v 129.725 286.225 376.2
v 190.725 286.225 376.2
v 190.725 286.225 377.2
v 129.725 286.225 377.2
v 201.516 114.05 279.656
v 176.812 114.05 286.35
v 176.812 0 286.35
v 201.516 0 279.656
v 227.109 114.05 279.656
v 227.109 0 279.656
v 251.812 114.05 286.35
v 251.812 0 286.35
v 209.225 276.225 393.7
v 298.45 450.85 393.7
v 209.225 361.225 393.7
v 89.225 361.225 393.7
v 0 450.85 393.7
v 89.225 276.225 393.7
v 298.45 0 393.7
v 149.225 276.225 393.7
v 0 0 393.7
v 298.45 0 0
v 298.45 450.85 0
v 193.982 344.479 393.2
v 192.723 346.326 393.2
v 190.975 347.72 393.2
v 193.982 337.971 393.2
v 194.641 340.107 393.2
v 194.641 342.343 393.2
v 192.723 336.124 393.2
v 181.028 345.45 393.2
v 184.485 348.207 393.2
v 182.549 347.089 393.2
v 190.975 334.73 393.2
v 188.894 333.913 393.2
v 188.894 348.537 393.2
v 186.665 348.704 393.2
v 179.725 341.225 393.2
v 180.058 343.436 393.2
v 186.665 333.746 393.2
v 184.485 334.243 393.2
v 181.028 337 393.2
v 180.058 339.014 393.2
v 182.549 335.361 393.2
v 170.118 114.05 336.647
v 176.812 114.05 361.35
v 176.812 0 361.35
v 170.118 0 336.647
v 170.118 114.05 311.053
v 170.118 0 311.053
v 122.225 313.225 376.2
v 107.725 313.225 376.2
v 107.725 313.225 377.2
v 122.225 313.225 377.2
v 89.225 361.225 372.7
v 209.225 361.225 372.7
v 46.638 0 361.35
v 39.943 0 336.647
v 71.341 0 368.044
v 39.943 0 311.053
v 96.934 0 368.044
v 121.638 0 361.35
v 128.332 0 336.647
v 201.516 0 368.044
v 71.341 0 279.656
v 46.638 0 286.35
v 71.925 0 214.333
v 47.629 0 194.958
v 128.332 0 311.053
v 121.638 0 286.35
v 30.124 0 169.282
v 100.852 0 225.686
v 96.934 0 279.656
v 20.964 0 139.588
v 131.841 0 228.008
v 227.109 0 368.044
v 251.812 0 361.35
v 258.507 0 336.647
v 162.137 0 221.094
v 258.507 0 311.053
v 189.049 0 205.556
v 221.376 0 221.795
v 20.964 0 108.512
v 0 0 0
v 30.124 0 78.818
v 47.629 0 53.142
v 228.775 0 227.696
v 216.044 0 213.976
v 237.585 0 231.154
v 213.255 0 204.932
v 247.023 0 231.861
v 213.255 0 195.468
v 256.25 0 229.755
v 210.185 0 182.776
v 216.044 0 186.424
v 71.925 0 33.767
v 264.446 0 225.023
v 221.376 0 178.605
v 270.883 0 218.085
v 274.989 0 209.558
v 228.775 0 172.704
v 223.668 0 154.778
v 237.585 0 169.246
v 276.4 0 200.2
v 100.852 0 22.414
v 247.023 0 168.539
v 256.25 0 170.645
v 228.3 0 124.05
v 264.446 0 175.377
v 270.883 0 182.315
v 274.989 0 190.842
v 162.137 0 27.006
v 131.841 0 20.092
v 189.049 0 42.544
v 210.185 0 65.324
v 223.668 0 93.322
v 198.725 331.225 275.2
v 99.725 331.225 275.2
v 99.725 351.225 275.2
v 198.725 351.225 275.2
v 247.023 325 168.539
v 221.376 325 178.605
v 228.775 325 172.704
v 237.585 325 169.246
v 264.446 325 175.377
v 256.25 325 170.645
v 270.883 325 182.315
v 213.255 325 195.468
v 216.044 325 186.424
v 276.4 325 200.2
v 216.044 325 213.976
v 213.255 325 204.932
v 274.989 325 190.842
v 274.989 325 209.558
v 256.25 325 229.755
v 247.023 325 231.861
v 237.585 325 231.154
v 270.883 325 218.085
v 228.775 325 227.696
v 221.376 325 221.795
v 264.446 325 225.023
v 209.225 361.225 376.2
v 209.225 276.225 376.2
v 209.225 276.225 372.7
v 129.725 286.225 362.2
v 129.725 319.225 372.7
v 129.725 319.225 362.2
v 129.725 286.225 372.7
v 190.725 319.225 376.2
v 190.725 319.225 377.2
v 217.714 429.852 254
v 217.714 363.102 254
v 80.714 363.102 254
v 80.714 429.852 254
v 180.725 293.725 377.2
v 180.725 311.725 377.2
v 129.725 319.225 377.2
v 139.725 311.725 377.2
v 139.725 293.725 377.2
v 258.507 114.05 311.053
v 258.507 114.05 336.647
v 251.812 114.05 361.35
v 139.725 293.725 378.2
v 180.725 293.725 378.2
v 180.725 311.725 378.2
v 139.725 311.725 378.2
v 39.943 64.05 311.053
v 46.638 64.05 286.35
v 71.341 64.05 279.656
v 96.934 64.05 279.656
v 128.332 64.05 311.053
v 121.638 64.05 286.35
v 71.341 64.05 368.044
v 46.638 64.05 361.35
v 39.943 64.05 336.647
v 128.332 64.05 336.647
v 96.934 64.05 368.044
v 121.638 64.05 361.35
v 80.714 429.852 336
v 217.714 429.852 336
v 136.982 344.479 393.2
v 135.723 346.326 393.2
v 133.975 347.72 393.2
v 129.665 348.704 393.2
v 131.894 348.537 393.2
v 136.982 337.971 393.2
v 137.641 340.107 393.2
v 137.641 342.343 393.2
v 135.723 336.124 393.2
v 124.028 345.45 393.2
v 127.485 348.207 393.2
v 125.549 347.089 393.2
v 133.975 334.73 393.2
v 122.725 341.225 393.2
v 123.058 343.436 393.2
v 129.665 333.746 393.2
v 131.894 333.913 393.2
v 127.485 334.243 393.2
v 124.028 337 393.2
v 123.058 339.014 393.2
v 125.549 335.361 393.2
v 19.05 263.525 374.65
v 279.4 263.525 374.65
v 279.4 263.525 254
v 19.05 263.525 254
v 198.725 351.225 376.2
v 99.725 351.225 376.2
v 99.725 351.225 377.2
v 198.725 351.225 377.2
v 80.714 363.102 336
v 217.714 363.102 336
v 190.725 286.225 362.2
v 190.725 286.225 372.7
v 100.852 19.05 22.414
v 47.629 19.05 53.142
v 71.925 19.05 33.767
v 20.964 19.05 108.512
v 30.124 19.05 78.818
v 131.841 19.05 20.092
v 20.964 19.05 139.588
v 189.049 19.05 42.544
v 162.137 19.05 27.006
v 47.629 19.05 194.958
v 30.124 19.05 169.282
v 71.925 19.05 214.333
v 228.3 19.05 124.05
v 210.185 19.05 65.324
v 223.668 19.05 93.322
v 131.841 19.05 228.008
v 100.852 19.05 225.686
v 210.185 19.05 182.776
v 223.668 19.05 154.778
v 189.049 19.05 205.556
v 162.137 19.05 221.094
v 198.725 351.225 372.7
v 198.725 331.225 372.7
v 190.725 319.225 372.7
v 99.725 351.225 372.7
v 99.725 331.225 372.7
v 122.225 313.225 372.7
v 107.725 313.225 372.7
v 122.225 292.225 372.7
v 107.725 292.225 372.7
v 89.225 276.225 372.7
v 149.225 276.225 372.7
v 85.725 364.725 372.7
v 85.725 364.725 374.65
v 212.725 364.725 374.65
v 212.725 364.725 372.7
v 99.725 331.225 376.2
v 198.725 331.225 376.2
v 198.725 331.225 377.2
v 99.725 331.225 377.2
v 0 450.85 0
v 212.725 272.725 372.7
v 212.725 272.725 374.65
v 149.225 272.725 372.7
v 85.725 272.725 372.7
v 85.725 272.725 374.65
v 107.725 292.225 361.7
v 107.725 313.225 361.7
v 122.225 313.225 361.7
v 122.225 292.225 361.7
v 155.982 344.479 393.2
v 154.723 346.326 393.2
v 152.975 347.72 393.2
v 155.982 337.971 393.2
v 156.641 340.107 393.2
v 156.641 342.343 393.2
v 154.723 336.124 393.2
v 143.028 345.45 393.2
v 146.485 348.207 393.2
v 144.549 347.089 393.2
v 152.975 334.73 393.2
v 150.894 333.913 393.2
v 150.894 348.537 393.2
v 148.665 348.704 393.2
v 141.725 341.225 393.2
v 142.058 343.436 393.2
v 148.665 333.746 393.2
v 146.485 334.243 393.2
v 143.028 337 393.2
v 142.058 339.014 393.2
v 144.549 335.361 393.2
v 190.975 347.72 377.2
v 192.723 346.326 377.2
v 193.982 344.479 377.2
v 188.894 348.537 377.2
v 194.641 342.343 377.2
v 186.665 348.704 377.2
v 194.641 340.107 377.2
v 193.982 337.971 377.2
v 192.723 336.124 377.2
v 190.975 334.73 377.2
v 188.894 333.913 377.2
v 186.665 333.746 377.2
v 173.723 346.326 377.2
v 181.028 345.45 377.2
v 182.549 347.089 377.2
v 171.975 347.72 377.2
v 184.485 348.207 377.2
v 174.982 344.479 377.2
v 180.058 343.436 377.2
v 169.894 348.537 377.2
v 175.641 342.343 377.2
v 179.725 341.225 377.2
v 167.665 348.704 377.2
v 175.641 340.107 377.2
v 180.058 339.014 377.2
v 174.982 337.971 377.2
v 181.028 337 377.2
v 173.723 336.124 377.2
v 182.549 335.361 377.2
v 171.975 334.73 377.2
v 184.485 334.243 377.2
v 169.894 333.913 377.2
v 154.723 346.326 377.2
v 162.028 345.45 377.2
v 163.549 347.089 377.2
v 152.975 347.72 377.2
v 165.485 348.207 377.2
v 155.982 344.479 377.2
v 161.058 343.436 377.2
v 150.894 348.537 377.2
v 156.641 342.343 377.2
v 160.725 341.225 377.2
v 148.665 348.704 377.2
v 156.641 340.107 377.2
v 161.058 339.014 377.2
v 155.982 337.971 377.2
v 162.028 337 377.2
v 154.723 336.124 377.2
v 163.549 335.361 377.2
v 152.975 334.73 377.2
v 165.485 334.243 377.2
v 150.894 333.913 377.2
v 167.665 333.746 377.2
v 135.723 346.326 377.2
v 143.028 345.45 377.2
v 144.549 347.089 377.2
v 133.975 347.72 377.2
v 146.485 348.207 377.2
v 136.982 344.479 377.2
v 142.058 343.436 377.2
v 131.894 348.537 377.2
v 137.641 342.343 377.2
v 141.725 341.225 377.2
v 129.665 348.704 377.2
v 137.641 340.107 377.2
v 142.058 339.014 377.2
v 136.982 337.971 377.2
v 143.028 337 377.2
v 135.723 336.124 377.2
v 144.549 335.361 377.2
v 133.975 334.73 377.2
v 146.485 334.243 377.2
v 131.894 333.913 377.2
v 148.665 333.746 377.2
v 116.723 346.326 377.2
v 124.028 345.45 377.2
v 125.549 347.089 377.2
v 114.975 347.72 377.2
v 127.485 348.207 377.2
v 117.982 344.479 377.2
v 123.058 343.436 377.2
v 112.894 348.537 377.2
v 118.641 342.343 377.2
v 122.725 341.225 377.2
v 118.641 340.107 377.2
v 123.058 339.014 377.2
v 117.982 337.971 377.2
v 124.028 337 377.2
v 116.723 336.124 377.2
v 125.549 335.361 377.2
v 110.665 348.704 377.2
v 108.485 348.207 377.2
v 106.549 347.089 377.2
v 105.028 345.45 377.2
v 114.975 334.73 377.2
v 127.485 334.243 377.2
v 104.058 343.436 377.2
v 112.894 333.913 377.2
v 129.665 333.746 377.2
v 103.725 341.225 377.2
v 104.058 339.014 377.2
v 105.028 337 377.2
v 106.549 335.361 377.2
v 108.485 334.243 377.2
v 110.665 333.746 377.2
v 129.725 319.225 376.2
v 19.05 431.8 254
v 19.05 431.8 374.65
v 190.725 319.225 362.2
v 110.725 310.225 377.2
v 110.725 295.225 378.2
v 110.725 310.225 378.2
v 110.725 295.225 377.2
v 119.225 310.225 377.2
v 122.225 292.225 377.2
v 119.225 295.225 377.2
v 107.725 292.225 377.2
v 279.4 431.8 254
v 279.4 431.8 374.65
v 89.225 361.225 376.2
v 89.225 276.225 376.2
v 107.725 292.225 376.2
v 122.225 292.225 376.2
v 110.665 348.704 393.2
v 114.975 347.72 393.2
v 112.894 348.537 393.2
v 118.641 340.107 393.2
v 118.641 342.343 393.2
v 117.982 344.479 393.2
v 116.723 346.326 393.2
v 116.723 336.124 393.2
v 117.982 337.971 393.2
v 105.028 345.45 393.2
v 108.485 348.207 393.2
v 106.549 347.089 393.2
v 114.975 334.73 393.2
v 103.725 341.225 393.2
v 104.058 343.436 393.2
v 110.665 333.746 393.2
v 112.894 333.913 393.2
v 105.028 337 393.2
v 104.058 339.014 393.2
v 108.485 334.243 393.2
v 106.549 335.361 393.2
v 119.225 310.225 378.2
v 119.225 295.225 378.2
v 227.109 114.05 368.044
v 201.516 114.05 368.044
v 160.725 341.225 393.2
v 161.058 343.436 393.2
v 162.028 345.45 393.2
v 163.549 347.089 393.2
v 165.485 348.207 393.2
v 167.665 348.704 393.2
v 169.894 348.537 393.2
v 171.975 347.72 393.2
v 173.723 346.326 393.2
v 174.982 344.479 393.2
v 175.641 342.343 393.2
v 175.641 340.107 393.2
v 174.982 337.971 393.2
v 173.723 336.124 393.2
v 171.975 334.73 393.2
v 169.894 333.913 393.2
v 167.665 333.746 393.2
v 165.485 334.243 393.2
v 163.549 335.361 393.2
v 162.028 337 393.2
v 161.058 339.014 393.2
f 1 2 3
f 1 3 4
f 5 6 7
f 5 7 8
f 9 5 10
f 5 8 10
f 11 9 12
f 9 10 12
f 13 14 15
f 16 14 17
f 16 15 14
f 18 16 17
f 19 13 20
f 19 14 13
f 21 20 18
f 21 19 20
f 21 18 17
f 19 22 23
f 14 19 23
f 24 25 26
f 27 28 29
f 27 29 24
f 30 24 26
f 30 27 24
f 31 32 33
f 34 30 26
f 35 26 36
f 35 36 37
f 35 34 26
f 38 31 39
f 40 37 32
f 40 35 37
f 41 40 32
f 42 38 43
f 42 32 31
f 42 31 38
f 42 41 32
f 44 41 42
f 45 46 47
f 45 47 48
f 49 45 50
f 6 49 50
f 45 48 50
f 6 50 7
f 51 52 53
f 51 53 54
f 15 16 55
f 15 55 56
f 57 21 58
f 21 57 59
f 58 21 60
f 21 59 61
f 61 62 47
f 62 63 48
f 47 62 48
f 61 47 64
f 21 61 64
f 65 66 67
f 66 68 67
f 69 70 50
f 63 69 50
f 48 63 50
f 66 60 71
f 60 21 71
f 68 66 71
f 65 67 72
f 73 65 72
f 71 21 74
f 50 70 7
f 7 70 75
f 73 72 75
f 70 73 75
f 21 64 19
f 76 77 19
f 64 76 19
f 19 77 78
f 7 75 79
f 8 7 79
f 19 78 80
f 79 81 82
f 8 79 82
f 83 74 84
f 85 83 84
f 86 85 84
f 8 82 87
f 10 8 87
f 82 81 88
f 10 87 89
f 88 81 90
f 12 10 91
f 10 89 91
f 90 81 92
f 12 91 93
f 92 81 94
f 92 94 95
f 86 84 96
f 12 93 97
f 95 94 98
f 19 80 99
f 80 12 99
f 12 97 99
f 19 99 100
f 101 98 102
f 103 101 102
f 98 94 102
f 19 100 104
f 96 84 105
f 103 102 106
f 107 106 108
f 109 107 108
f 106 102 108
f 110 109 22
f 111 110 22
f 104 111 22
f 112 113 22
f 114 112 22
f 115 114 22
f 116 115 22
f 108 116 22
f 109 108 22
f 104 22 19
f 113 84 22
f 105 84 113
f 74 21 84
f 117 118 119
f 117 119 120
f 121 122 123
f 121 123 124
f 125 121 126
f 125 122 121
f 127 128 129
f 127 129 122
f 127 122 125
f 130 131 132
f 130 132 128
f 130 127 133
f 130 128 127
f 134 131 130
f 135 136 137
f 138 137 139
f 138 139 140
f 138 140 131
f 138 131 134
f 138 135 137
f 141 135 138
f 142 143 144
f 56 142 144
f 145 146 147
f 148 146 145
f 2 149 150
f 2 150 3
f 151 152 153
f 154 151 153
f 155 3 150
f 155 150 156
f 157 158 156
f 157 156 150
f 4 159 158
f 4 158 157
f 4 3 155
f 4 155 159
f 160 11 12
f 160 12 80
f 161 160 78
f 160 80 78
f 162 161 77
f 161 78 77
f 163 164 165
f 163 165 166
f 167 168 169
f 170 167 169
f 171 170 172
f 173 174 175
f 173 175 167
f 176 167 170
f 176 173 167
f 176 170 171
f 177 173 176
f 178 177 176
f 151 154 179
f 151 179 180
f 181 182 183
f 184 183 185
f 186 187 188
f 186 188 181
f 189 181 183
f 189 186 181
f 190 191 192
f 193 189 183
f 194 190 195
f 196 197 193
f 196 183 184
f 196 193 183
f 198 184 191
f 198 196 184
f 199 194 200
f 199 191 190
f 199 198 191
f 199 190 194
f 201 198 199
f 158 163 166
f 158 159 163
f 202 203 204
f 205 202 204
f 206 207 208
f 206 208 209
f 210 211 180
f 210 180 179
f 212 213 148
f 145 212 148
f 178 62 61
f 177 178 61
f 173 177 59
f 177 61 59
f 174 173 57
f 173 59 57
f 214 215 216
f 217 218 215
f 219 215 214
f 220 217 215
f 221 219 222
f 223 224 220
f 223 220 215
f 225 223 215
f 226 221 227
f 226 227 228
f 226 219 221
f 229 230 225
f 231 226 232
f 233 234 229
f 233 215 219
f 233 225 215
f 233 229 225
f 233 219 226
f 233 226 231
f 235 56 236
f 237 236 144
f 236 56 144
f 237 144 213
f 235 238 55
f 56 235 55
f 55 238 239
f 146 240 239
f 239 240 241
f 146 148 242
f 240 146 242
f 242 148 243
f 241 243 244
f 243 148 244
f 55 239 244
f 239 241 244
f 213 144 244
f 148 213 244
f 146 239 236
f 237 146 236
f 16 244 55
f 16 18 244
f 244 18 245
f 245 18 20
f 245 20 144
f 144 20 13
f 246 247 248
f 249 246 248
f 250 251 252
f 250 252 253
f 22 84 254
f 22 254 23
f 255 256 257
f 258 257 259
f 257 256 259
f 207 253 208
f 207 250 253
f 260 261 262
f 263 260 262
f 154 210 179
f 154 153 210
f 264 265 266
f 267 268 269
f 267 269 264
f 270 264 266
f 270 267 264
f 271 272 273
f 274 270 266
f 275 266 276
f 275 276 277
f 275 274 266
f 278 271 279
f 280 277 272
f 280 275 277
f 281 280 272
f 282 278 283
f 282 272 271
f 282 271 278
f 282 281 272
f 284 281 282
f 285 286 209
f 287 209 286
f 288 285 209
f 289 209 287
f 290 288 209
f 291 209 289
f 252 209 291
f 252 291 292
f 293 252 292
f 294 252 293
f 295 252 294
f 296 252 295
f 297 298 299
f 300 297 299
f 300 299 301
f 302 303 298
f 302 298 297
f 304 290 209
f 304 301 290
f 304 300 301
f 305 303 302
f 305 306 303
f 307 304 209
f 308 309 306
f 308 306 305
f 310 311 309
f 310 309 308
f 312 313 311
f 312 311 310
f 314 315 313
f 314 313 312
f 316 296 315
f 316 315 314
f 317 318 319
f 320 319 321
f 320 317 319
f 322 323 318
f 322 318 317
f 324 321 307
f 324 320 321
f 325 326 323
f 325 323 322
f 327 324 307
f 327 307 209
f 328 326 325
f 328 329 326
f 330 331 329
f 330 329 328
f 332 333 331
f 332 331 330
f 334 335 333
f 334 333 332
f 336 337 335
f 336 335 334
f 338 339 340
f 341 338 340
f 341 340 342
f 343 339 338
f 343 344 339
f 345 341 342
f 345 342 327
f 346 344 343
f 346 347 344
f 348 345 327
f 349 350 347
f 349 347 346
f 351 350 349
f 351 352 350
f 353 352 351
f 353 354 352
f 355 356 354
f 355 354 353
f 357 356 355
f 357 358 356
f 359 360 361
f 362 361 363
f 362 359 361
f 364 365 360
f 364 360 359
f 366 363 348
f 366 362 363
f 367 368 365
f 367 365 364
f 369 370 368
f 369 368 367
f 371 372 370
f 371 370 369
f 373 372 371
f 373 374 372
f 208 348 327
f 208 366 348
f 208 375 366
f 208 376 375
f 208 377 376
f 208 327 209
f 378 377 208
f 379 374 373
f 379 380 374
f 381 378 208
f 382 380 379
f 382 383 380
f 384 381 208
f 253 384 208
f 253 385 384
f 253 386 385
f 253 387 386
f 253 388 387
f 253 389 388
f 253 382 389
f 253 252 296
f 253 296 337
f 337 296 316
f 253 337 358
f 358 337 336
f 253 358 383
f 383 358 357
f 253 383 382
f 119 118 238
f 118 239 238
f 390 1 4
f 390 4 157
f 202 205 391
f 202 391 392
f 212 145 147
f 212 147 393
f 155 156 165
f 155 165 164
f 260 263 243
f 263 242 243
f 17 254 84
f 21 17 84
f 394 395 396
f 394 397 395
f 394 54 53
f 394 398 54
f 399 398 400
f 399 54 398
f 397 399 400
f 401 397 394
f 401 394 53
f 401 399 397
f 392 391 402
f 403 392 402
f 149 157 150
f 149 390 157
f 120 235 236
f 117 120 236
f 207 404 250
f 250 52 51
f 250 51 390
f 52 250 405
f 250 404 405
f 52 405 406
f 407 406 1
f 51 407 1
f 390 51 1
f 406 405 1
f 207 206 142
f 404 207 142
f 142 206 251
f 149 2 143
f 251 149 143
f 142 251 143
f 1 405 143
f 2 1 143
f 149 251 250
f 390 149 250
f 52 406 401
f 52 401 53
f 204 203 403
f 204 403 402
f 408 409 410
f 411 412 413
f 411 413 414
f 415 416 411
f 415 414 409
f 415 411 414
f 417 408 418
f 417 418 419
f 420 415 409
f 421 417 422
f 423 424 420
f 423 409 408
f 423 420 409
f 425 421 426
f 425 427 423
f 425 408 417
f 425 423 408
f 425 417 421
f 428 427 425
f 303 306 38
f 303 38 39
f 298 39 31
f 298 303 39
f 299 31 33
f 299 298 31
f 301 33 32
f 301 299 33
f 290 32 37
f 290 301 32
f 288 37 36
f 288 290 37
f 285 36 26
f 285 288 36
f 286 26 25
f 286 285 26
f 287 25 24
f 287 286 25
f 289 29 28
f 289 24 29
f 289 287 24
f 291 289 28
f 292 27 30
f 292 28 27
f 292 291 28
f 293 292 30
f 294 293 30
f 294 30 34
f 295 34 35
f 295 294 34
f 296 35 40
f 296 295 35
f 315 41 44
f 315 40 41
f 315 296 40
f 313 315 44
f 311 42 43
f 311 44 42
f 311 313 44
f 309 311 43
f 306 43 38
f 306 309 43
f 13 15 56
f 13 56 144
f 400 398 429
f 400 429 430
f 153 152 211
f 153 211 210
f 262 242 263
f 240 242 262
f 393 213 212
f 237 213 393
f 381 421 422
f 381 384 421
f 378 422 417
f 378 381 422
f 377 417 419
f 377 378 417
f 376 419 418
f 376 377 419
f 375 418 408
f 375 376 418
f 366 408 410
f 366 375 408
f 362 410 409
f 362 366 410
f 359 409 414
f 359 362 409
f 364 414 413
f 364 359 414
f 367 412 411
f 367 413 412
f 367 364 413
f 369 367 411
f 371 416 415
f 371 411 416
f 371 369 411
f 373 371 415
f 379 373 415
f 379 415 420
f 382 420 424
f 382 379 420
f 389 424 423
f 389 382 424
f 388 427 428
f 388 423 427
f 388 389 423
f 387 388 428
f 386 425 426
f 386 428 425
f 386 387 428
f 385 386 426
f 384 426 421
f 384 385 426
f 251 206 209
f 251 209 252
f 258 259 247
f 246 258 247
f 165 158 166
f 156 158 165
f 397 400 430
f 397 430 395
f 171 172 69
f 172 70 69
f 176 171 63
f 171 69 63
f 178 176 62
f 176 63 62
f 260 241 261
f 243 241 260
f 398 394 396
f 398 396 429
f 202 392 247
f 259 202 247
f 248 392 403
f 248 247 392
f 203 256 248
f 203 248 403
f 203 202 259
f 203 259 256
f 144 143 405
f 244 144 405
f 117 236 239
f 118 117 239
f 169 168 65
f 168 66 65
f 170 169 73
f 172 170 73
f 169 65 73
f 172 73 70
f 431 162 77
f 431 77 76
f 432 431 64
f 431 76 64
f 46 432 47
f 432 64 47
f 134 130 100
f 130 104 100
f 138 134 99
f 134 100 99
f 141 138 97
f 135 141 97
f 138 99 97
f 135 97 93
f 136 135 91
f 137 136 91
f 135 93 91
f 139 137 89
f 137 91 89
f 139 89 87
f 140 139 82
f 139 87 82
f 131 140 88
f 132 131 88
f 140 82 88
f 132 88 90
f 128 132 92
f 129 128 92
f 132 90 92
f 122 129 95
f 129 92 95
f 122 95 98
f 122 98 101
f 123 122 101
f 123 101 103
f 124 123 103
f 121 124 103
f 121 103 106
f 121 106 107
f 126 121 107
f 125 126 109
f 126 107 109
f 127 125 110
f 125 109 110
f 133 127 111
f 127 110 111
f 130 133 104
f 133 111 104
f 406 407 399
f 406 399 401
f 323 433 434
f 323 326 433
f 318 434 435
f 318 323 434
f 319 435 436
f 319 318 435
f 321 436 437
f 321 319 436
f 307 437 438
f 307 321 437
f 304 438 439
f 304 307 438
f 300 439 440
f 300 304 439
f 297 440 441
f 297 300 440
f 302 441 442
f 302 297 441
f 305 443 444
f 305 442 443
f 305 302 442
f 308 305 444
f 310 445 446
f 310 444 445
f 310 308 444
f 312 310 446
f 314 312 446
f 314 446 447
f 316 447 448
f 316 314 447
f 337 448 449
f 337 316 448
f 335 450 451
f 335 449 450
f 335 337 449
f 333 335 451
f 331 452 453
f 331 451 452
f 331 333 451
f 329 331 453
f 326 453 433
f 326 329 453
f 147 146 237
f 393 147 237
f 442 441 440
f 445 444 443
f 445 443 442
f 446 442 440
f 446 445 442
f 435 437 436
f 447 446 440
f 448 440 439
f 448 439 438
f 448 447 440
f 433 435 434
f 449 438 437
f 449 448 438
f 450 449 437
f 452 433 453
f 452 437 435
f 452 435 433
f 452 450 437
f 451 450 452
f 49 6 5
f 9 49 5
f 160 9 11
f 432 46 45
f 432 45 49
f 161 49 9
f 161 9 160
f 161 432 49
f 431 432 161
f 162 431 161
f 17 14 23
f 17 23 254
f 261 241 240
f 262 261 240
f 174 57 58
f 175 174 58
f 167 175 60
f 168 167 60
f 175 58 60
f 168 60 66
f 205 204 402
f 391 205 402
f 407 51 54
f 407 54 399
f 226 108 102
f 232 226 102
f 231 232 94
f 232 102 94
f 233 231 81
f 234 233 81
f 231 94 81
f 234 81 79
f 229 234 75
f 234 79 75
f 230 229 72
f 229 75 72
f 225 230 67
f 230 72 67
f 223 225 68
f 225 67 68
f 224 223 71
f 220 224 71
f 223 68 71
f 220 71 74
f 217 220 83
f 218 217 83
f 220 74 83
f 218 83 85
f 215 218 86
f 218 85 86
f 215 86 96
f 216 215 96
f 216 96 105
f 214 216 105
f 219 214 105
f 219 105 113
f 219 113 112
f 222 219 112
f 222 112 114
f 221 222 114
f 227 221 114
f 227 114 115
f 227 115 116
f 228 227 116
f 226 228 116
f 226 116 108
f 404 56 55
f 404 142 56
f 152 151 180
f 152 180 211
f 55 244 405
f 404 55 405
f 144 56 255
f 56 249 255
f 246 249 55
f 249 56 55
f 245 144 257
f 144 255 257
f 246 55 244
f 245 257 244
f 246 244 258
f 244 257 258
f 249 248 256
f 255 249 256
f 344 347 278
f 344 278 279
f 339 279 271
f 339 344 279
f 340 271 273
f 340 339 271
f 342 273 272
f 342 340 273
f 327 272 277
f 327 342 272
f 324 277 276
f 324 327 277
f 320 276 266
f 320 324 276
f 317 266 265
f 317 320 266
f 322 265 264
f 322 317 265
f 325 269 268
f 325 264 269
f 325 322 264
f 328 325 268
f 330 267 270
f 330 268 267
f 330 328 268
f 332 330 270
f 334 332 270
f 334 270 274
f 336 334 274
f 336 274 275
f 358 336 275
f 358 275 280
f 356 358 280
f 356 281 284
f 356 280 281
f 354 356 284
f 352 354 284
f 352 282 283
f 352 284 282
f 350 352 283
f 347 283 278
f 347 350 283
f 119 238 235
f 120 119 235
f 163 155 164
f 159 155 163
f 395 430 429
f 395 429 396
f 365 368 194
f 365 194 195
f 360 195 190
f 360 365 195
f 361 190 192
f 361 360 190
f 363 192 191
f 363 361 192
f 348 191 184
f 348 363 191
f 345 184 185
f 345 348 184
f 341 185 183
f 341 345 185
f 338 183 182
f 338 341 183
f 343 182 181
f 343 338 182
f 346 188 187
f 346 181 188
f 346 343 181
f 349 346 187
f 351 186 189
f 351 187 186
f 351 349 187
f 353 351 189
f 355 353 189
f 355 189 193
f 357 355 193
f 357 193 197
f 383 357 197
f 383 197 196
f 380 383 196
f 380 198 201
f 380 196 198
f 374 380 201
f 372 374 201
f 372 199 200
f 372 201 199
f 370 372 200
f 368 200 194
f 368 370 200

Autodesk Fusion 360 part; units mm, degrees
sketch "Sketch1" plane through (0, 0, 0) normal (0, 0, 1) x (1, 0, 0)
  line L0 (0, 0) -> (298.45, 0)
  line L1 (298.45, 0) -> (298.45, 450.85)
  line L2 (298.45, 450.85) -> (0, 450.85)
  line L3 (0, 450.85) -> (0, 0)
  dimension "d1" = 298.45
  dimension "d2" = 450.85
extrude "Extrude1" add sketch "Sketch1" along normal blind 254 makes body 1
sketch "Sketch2" plane through (0, 0, 0) normal (0, -1, 0) x (1, 0, 0)
  line L0 (0, 0) -> (298.45, 0)
  line L1 (298.45, 0) -> (298.45, 254)
  line L2 (298.45, 254) -> (0, 254)
  line L3 (0, 254) -> (0, 0)
  line L4 (19.05, 19.05) -> (279.4, 19.05)
  line L5 (279.4, 19.05) -> (279.4, 234.95)
  line L6 (279.4, 234.95) -> (19.05, 234.95)
  line L7 (19.05, 234.95) -> (19.05, 19.05)
  circle A0 centre (124.05, 124.05) radius 104.25
  circle A1 centre (244.65, 200.2) radius 31.75
  circle A2 centre (244.65, 200.2) radius 34.75
  dimension "d5" = -19.05
  dimension "d6" = 208.5
  dimension "d7" = 105
  dimension "d8" = 105
  dimension "d9" = 63.5
  dimension "d10" = 34.75
  dimension "d11" = 34.75
  dimension "d12" = 3
extrude "Extrude2" add 1 faces at (99.4833, 150.2833, 254) along direction (0, 0, 1) blind 139.7 on bodies 1 bodies 1
sketch "Sketch3" plane through (0, 0, 0) normal (0, -1, 0) x (1, 0, 0)
  line L0 (0, 0) -> (298.45, 0)
  line L1 (298.45, 0) -> (298.45, 393.7)
  line L2 (298.45, 393.7) -> (0, 393.7)
  line L3 (0, 393.7) -> (0, 0)
  line L4 (298.45, 254) -> (0, 254)
  line L5 (0, 393.7) -> (298.45, 393.7)
  line L6 (298.45, 393.7) -> (298.45, 254)
  line L7 (298.45, 254) -> (0, 254)
  line L8 (0, 254) -> (0, 393.7)
  line L9 (279.4, 273.05) -> (19.05, 273.05)
  line L10 (19.05, 273.05) -> (19.05, 374.65)
  line L11 (19.05, 374.65) -> (279.4, 374.65)
  line L12 (279.4, 374.65) -> (279.4, 273.05)
  line L13 (46.6375, 361.35) -> (121.6375, 361.35)
  line L14 (121.6375, 361.35) -> (121.6375, 286.35)
  line L15 (121.6375, 286.35) -> (46.6375, 286.35)
  line L16 (46.6375, 286.35) -> (46.6375, 361.35)
  line L17 (84.1375, 361.35) -> (84.1375, 340.8281)
  line L18 (19.05, 374.65) -> (149.225, 374.65)
  line L19 (149.225, 374.65) -> (279.4, 374.65)
  line L20 (46.6375, 323.85) -> (54.2725, 323.85)
  line L21 (149.225, 374.65) -> (149.225, 361.3588)
  arc A0 (121.6375, 361.35) -> (46.6375, 361.35) centre (84.1375, 271.8919) ccw
  arc A1 (46.6375, 286.35) -> (121.6375, 286.35) centre (84.1375, 375.8081) ccw
  arc A2 (121.6375, 286.35) -> (121.6375, 361.35) centre (32.1794, 323.85) ccw
  arc A3 (46.6375, 361.35) -> (46.6375, 286.35) centre (136.0956, 323.85) ccw
  arc A4 (251.8125, 361.35) -> (176.8125, 361.35) centre (214.3125, 271.8919) ccw
  arc A5 (176.8125, 361.35) -> (176.8125, 286.35) centre (266.2706, 323.85) ccw
  arc A6 (176.8125, 286.35) -> (251.8125, 286.35) centre (214.3125, 375.8081) ccw
  arc A7 (251.8125, 286.35) -> (251.8125, 361.35) centre (162.3544, 323.85) ccw
  dimension "d15" = 19.05
  dimension "d16" = 75
  dimension "d17" = 75
  dimension "d18" = 65.0875
  dimension "d19" = 50.8
  dimension "d20" = 97
  dimension "d21" = 97
  dimension "d22" = 97
  dimension "d23" = 97
extrude "Extrude3" cut sketch "Sketch3" sketch "Sketch2" against normal blind 19.05 contours L13 A0 | L13 L14 L15 L16 | L16 A3 | L14 A2 | L15 A1 | A4 A5 A6 A7 of sketch 2 contours A0 bodies 1
shell "Shell1" thickness 19.05 removed faces 1 at (78.1482, 19.05, 149.2169) on bodies 1
extrude "Extrude4" cut 1 faces at (69.1235, 19.05, 323.85) along direction (0, 1, 0) blind 45 on bodies 1 bodies 1
extrude "Extrude5" cut 1 faces at (214.3125, 19.05, 308.836) along direction (0, 1, 0) blind 95 on bodies 1 bodies 1
extrude "Extrude6" add sketch "Sketch2" against normal blind 314.96 contours A2 | A1 bodies 1
extrude "Extrude7" cut sketch "Sketch2" against normal blind 325 contours A1 bodies 1
sketch "Sketch4" plane through (298.45, 0, 0) normal (1, 0, 0) x (0, 1, 0)
  line L0 (0, 0) -> (450.85, 0)
  line L1 (450.85, 0) -> (450.85, 393.7)
  line L2 (450.85, 393.7) -> (0, 393.7)
  line L3 (0, 393.7) -> (0, 0)
  line L4 (0, 254) -> (263.525, 254)
  line L5 (263.525, 254) -> (450.85, 254)
  line L6 (450.85, 254) -> (450.85, 393.7)
  line L7 (450.85, 393.7) -> (263.525, 393.7)
  line L8 (263.525, 393.7) -> (263.525, 254)
  point P0 (0, 254)
  dimension "d35" = 263.525
extrude "Extrude8" cut sketch "Sketch4" against normal blind 390 contours L1 L2 L5 L6 L7 L8 bodies 1
sketch "Sketch5" plane through (0, 450.85, 0) normal (0, 1, 0) x (-1, 0, 0)
  line L0 (0, 254) -> (-298.45, 254)
  line L1 (-298.45, 254) -> (-298.45, 0)
  line L2 (-298.45, 0) -> (0, 0)
  line L3 (0, 0) -> (0, 254)
  line L4 (-298.45, 254) -> (0, 254)
  line L5 (0, 254) -> (0, 234.95)
  line L6 (0, 234.95) -> (-298.45, 234.95)
  line L7 (-298.45, 234.95) -> (-298.45, 254)
  dimension "d38" = 19.05
extrude "Extrude9" add sketch "Sketch5" against normal blind 450 contours L0 L1 L3 L4 L5 L6 L7 bodies 1
sketch "Sketch6" plane through (0, 0, 393.7) normal (0, 0, 1) x (-1, 0, 0)
  line L0 (-298.45, -263.525) -> (0, -263.525)
  line L1 (0, -263.525) -> (0, 0)
  line L2 (0, 0) -> (-298.45, 0)
  line L3 (-298.45, 0) -> (-298.45, -263.525)
  line L4 (0, -263.525) -> (-298.45, -263.525)
  line L5 (-298.45, -263.525) -> (-298.45, -244.475)
  line L6 (-298.45, -244.475) -> (0, -244.475)
  line L7 (0, -244.475) -> (0, -263.525)
  dimension "d41" = 19.05
extrude "Extrude10" add sketch "Sketch6" against normal blind 140 contours L0 L1 L3 L4 L5 L6 L7 bodies 1
sketch "Battery" plane through (0, 0, 254) normal (0, 0, 1) x (-1, 0, 0)
  line L0 (0, -263.525) -> (-298.45, -263.525)
  line L1 (-298.45, -263.525) -> (-298.45, -450.85)
  line L2 (-298.45, -450.85) -> (0, -450.85)
  line L3 (0, -450.85) -> (0, -263.525)
  line L4 (-217.7141, -363.1024) -> (-80.7141, -363.1024)
  line L5 (-80.7141, -363.1024) -> (-80.7141, -429.8524)
  line L6 (-80.7141, -429.8524) -> (-217.7141, -429.8524)
  line L7 (-217.7141, -429.8524) -> (-217.7141, -363.1024)
  line L8 (-198.0587, -450.85) -> (-198.0587, -431.8)
  dimension "d44" = 137
  dimension "d45" = 66.75
  dimension "d100" = 19.05
extrude "Extrude11" add sketch "Battery" along normal blind 82 separate body contours L4 L5 L6 L7 makes body 2
sketch "Sketch8" plane through (0, 0, 254) normal (0, 0, 1) x (-1, 0, 0)
  line L0 (0, -263.525) -> (-298.45, -263.525)
  line L1 (-298.45, -263.525) -> (-298.45, -450.85)
  line L2 (-298.45, -450.85) -> (0, -450.85)
  line L3 (0, -450.85) -> (0, -263.525)
  line L4 (-298.45, -450.85) -> (0, -450.85)
  line L5 (0, -450.85) -> (0, -431.8)
  line L6 (0, -431.8) -> (-298.45, -431.8)
  line L7 (-298.45, -431.8) -> (-298.45, -450.85)
  dimension "d48" = 19.05
extrude "Extrude12" add sketch "Sketch8" along normal blind 139.7 separate body contours L1 L2 L3 L4 L5 L6 L7 makes body 3
sketch "Sketch9" plane through (0, 263.525, 0) normal (0, 1, 0) x (-1, 0, 0)
  line L0 (0, 254) -> (0, 393.7)
  line L1 (0, 393.7) -> (-298.45, 393.7)
  line L2 (-298.45, 393.7) -> (-298.45, 254)
  line L3 (-298.45, 254) -> (0, 254)
  line L4 (-279.4, 273.05) -> (-19.05, 273.05)
  line L5 (-19.05, 273.05) -> (-19.05, 374.65)
  line L6 (-19.05, 374.65) -> (-279.4, 374.65)
  line L7 (-279.4, 374.65) -> (-279.4, 273.05)
  line L8 (-279.4, 273.05) -> (-279.4, 254)
  line L9 (-19.05, 273.05) -> (-19.05, 254)
  dimension "d51" = -19.05
extrude "Extrude13" add sketch "Sketch9" along normal blind 168.275 contours L0 L1 L2 L3 L5 L6 L7 L8 L9 bodies 3 2 1
ref_plane "WorkPlane1" through (0, 0, 373.7) normal (0, 0, 1) x (1, 0, 0)
ref_plane "WorkPlane2" through (0, 430.85, 0) normal (0, 1, 0) x (0, 0, 1)
sketch "Sketch10" plane through (0, 0, 393.7) normal (0, 0, 1) x (-1, 0, 0)
  line L0 (-298.45, 0) -> (-298.45, -450.85)
  line L1 (-298.45, -450.85) -> (0, -450.85)
  line L2 (0, -450.85) -> (0, 0)
  line L3 (0, 0) -> (-298.45, 0)
  line L4 (-279.4, -263.525) -> (-19.05, -263.525)
  line L5 (-19.05, -263.525) -> (-279.4, -263.525)
  line L6 (-149.225, -263.525) -> (-149.225, -276.225)
  line L7 (-149.225, -276.225) -> (-209.225, -276.225)
  line L8 (-209.225, -276.225) -> (-89.225, -276.225)
  line L9 (-89.225, -276.225) -> (-89.225, -361.225)
  line L10 (-89.225, -361.225) -> (-209.225, -361.225)
  line L11 (-209.225, -361.225) -> (-209.225, -276.225)
  line L12 (-212.725, -272.725) -> (-85.725, -272.725)
  line L13 (-85.725, -272.725) -> (-85.725, -364.725)
  line L14 (-85.725, -364.725) -> (-212.725, -364.725)
  line L15 (-212.725, -364.725) -> (-212.725, -272.725)
  dimension "d56" = 12.7
  dimension "d57" = 60
  dimension "d58" = 120
  dimension "d59" = 85
  dimension "d60" = -3.5
extrude "Extrude14" cut sketch "Sketch10" against normal blind 30 contours L7 L8 L9 L10 L11 bodies 3
extrude "Extrude15" add sketch "Sketch10" against normal blind 21 contours L12 L13 L14 L15 bodies 3
sketch "Sketch11" plane through (0, 276.225, 0) normal (0, 1, 0) x (-1, 0, 0)
  line L0 (-89.225, 372.7) -> (-89.225, 393.7)
  line L1 (-89.225, 393.7) -> (-209.225, 393.7)
  line L2 (-209.225, 393.7) -> (-209.225, 372.7)
  line L3 (-209.225, 372.7) -> (-89.225, 372.7)
  line L4 (-209.225, 372.7) -> (-89.225, 372.7)
  line L5 (-89.225, 372.7) -> (-89.225, 376.2)
  line L6 (-89.225, 376.2) -> (-209.225, 376.2)
  line L7 (-209.225, 376.2) -> (-209.225, 372.7)
  dimension "d65" = 3.5
extrude "Extrude16" add sketch "Sketch11" along normal blind 85 separate body contours L0 L2 L3 L4 L5 L6 L7 makes body 4
sketch "Sketch12" plane through (0, 0, 376.2) normal (0, 0, 1) x (-1, 0, 0)
  line L0 (-89.225, -276.225) -> (-209.225, -276.225)
  line L1 (-209.225, -276.225) -> (-209.225, -361.225)
  line L2 (-209.225, -361.225) -> (-89.225, -361.225)
  line L3 (-89.225, -361.225) -> (-89.225, -276.225)
  line L4 (-198.725, -331.225) -> (-99.725, -331.225)
  line L5 (-99.725, -331.225) -> (-99.725, -351.225)
  line L6 (-99.725, -351.225) -> (-198.725, -351.225)
  line L7 (-198.725, -351.225) -> (-198.725, -331.225)
  line L8 (-190.725, -286.225) -> (-129.725, -286.225)
  line L9 (-129.725, -286.225) -> (-129.725, -319.225)
  line L10 (-129.725, -319.225) -> (-190.725, -319.225)
  line L11 (-190.725, -319.225) -> (-190.725, -286.225)
  line L12 (-122.225, -292.225) -> (-107.725, -292.225)
  line L13 (-107.725, -292.225) -> (-107.725, -313.225)
  line L14 (-107.725, -313.225) -> (-122.225, -313.225)
  line L15 (-122.225, -313.225) -> (-122.225, -292.225)
  line L16 (-107.725, -302.725) -> (-107.7476, -302.725)
  circle A0 centre (-149.225, -341.225) radius 7.5
  circle A1 centre (-130.225, -341.225) radius 7.5
  circle A2 centre (-111.225, -341.225) radius 7.5
  circle A3 centre (-168.225, -341.225) radius 7.5
  circle A4 centre (-187.225, -341.225) radius 7.5
  line L17 (-190.725, -286.225) -> (-180.725, -286.225)
  line L18 (-180.725, -286.225) -> (-180.725, -293.725)
  line L19 (-180.725, -293.725) -> (-190.725, -293.725)
  line L20 (-190.725, -293.725) -> (-190.725, -286.225)
  line L21 (-180.725, -293.725) -> (-139.725, -293.725)
  line L22 (-139.725, -293.725) -> (-139.725, -311.725)
  line L23 (-139.725, -311.725) -> (-180.725, -311.725)
  line L24 (-180.725, -311.725) -> (-180.725, -293.725)
  line L25 (-110.725, -310.225) -> (-119.225, -310.225)
  line L26 (-119.225, -310.225) -> (-119.225, -295.225)
  line L27 (-119.225, -295.225) -> (-110.725, -295.225)
  line L28 (-110.725, -295.225) -> (-110.725, -310.225)
  dimension "d68" = 99
  dimension "d69" = 20
  dimension "d70" = 10.5
  dimension "d71" = 10.5
  dimension "d72" = 61
  dimension "d73" = 33
  dimension "d74" = 14.5
  dimension "d75" = 21
  dimension "d76" = 8
  dimension "d77" = 8
  dimension "d78" = 16.5
  dimension "d79" = 10
  dimension "d80" = 10
  dimension "d81" = 12
  dimension "d82" = 15
  dimension "d83" = 15
  dimension "d84" = 15
  dimension "d85" = 19
  dimension "d86" = 38
  dimension "d87" = 15
  dimension "d88" = 15
  dimension "d89" = 19
  dimension "d90" = 38
  dimension "d91" = 10
  dimension "d92" = 7.5
  dimension "d93" = 41
  dimension "d94" = 18
  dimension "d95" = 3
extrude "Extrude17" add sketch "Sketch12" along normal blind 2 contours L21 L22 L23 L24 | A0 | A1 | A2 | A3 | A4 | L25 L26 L27 L28 bodies 4
extrude "Extrude18" add sketch "Sketch12" along normal blind 1 contours L4 L5 L6 L7 | L8 L11 L17 L18 L19 L20 | L8 L9 L10 L11 L18 L19 | L12 L13 L14 L15 bodies 4
sketch "Sketch13" plane through (0, 0, 372.7) normal (0, 0, -1) x (1, 0, 0)
  line L0 (209.225, -276.225) -> (89.225, -276.225)
  line L1 (89.225, -276.225) -> (89.225, -361.225)
  line L2 (89.225, -361.225) -> (209.225, -361.225)
  line L3 (209.225, -361.225) -> (209.225, -276.225)
  line L4 (99.725, -351.225) -> (198.725, -351.225)
  line L5 (198.725, -351.225) -> (198.725, -331.225)
  line L6 (198.725, -331.225) -> (99.725, -331.225)
  line L7 (99.725, -331.225) -> (99.725, -351.225)
  line L8 (198.725, -351.225) -> (99.725, -351.225)
  line L9 (99.725, -351.225) -> (99.725, -331.225)
  line L10 (99.725, -331.225) -> (198.725, -331.225)
  line L11 (198.725, -331.225) -> (198.725, -351.225)
extrude "Extrude19" add sketch "Sketch13" along normal blind 97.5 contours L4 L5 L6 L7 L8 L9 L10 L11 bodies 4
sketch "Sketch14" plane through (0, 0, 372.7) normal (0, 0, -1) x (1, 0, 0)
  line L0 (198.725, -331.225) -> (198.725, -351.225)
  line L1 (198.725, -351.225) -> (99.725, -351.225)
  line L2 (99.725, -351.225) -> (99.725, -331.225)
  line L3 (99.725, -331.225) -> (198.725, -331.225)
  line L4 (209.225, -276.225) -> (89.225, -276.225)
  line L5 (89.225, -276.225) -> (89.225, -361.225)
  line L6 (89.225, -361.225) -> (209.225, -361.225)
  line L7 (209.225, -361.225) -> (209.225, -276.225)
  line L8 (129.725, -319.225) -> (190.725, -319.225)
  line L9 (190.725, -286.225) -> (129.725, -286.225)
  line L10 (190.725, -319.225) -> (129.725, -319.225)
  line L11 (129.725, -319.225) -> (129.725, -286.225)
  line L12 (129.725, -286.225) -> (190.725, -286.225)
  line L13 (190.725, -286.225) -> (190.725, -319.225)
extrude "Extrude20" add sketch "Sketch14" along normal blind 10.5 contours L8 L9 L10 L11 L12 L13 bodies 4
sketch "Sketch15" plane through (0, 0, 372.7) normal (0, 0, -1) x (1, 0, 0)
  line L0 (190.725, -286.225) -> (190.725, -319.225)
  line L1 (190.725, -319.225) -> (129.725, -319.225)
  line L2 (129.725, -319.225) -> (129.725, -286.225)
  line L3 (129.725, -286.225) -> (190.725, -286.225)
  line L4 (198.725, -331.225) -> (198.725, -351.225)
  line L5 (198.725, -351.225) -> (99.725, -351.225)
  line L6 (99.725, -351.225) -> (99.725, -331.225)
  line L7 (99.725, -331.225) -> (198.725, -331.225)
  line L8 (209.225, -276.225) -> (89.225, -276.225)
  line L9 (89.225, -276.225) -> (89.225, -361.225)
  line L10 (89.225, -361.225) -> (209.225, -361.225)
  line L11 (209.225, -361.225) -> (209.225, -276.225)
  line L12 (107.725, -313.225) -> (122.225, -313.225)
  line L13 (122.225, -292.225) -> (107.725, -292.225)
  line L14 (122.225, -313.225) -> (107.725, -313.225)
  line L15 (107.725, -313.225) -> (107.725, -292.225)
  line L16 (107.725, -292.225) -> (122.225, -292.225)
  line L17 (122.225, -292.225) -> (122.225, -313.225)
extrude "Extrude21" add sketch "Sketch15" along normal blind 11 contours L12 L13 L14 L15 L16 L17 bodies 4
extrude "Extrude22" add 5 faces at (185.6663, 342.6713, 378.2) (171.9142, 339.8123, 378.2) (147.3924, 339.5246, 378.2) (131.1663, 339.2704, 378.2) (109.6663, 343.1796, 378.2) along direction (0, 0, 1) blind 15 on bodies 4 bodies 4
sketch "Sketch16" plane through (0, 0, 0) normal (0, -1, 0) x (1, 0, 0)
  circle A0 centre (244.65, 200.2) radius 31.75
  arc A1 (251.8125, 361.35) -> (176.8125, 361.35) centre (214.3125, 271.8919) ccw
  arc A2 (251.8125, 286.35) -> (251.8125, 361.35) centre (162.3544, 323.85) ccw
  arc A3 (176.8125, 286.35) -> (251.8125, 286.35) centre (214.3125, 375.8081) ccw
  arc A4 (176.8125, 361.35) -> (176.8125, 286.35) centre (266.2706, 323.85) ccw
  arc A5 (46.6375, 286.35) -> (121.6375, 286.35) centre (84.1375, 375.8081) ccw
  arc A6 (46.6375, 361.35) -> (46.6375, 286.35) centre (136.0956, 323.85) ccw
  arc A7 (121.6375, 361.35) -> (46.6375, 361.35) centre (84.1375, 271.8919) ccw
  arc A8 (121.6375, 286.35) -> (121.6375, 361.35) centre (32.1794, 323.85) ccw
  circle A9 centre (124.05, 124.05) radius 104.25
  line L0 (0, 0) -> (298.45, 0)
  line L1 (298.45, 0) -> (298.45, 393.7)
  line L2 (298.45, 393.7) -> (0, 393.7)
  line L3 (0, 393.7) -> (0, 0)
  circle A10 centre (124.05, 124.05) radius 88.5
  dimension "d109" = 177
ref_plane "WorkPlane3" through (149.225, 40, 196.85) normal (0, -1, 0) x (1, 0, 0)
equation "d8 = d7"
equation "d10 = ( ( 63.5 / 2 ) * 1 mm ) + 3 mm"
equation "d11 = d10"
equation "d18 = ( 130.175 / 2 ) * 1 mm"
equation "d19 = ( 101.6 / 2 ) * 1 mm"
equation "d59 = 64 mm + 21 mm"
equation "d78 = ( 33 / 2 ) * 1 mm"
equation "d86 = ( 19 * 2 ) * 1 mm"
equation "d89 = d85"
equation "d90 = d86"
equation "d94 = 33 mm - 15 mm"
